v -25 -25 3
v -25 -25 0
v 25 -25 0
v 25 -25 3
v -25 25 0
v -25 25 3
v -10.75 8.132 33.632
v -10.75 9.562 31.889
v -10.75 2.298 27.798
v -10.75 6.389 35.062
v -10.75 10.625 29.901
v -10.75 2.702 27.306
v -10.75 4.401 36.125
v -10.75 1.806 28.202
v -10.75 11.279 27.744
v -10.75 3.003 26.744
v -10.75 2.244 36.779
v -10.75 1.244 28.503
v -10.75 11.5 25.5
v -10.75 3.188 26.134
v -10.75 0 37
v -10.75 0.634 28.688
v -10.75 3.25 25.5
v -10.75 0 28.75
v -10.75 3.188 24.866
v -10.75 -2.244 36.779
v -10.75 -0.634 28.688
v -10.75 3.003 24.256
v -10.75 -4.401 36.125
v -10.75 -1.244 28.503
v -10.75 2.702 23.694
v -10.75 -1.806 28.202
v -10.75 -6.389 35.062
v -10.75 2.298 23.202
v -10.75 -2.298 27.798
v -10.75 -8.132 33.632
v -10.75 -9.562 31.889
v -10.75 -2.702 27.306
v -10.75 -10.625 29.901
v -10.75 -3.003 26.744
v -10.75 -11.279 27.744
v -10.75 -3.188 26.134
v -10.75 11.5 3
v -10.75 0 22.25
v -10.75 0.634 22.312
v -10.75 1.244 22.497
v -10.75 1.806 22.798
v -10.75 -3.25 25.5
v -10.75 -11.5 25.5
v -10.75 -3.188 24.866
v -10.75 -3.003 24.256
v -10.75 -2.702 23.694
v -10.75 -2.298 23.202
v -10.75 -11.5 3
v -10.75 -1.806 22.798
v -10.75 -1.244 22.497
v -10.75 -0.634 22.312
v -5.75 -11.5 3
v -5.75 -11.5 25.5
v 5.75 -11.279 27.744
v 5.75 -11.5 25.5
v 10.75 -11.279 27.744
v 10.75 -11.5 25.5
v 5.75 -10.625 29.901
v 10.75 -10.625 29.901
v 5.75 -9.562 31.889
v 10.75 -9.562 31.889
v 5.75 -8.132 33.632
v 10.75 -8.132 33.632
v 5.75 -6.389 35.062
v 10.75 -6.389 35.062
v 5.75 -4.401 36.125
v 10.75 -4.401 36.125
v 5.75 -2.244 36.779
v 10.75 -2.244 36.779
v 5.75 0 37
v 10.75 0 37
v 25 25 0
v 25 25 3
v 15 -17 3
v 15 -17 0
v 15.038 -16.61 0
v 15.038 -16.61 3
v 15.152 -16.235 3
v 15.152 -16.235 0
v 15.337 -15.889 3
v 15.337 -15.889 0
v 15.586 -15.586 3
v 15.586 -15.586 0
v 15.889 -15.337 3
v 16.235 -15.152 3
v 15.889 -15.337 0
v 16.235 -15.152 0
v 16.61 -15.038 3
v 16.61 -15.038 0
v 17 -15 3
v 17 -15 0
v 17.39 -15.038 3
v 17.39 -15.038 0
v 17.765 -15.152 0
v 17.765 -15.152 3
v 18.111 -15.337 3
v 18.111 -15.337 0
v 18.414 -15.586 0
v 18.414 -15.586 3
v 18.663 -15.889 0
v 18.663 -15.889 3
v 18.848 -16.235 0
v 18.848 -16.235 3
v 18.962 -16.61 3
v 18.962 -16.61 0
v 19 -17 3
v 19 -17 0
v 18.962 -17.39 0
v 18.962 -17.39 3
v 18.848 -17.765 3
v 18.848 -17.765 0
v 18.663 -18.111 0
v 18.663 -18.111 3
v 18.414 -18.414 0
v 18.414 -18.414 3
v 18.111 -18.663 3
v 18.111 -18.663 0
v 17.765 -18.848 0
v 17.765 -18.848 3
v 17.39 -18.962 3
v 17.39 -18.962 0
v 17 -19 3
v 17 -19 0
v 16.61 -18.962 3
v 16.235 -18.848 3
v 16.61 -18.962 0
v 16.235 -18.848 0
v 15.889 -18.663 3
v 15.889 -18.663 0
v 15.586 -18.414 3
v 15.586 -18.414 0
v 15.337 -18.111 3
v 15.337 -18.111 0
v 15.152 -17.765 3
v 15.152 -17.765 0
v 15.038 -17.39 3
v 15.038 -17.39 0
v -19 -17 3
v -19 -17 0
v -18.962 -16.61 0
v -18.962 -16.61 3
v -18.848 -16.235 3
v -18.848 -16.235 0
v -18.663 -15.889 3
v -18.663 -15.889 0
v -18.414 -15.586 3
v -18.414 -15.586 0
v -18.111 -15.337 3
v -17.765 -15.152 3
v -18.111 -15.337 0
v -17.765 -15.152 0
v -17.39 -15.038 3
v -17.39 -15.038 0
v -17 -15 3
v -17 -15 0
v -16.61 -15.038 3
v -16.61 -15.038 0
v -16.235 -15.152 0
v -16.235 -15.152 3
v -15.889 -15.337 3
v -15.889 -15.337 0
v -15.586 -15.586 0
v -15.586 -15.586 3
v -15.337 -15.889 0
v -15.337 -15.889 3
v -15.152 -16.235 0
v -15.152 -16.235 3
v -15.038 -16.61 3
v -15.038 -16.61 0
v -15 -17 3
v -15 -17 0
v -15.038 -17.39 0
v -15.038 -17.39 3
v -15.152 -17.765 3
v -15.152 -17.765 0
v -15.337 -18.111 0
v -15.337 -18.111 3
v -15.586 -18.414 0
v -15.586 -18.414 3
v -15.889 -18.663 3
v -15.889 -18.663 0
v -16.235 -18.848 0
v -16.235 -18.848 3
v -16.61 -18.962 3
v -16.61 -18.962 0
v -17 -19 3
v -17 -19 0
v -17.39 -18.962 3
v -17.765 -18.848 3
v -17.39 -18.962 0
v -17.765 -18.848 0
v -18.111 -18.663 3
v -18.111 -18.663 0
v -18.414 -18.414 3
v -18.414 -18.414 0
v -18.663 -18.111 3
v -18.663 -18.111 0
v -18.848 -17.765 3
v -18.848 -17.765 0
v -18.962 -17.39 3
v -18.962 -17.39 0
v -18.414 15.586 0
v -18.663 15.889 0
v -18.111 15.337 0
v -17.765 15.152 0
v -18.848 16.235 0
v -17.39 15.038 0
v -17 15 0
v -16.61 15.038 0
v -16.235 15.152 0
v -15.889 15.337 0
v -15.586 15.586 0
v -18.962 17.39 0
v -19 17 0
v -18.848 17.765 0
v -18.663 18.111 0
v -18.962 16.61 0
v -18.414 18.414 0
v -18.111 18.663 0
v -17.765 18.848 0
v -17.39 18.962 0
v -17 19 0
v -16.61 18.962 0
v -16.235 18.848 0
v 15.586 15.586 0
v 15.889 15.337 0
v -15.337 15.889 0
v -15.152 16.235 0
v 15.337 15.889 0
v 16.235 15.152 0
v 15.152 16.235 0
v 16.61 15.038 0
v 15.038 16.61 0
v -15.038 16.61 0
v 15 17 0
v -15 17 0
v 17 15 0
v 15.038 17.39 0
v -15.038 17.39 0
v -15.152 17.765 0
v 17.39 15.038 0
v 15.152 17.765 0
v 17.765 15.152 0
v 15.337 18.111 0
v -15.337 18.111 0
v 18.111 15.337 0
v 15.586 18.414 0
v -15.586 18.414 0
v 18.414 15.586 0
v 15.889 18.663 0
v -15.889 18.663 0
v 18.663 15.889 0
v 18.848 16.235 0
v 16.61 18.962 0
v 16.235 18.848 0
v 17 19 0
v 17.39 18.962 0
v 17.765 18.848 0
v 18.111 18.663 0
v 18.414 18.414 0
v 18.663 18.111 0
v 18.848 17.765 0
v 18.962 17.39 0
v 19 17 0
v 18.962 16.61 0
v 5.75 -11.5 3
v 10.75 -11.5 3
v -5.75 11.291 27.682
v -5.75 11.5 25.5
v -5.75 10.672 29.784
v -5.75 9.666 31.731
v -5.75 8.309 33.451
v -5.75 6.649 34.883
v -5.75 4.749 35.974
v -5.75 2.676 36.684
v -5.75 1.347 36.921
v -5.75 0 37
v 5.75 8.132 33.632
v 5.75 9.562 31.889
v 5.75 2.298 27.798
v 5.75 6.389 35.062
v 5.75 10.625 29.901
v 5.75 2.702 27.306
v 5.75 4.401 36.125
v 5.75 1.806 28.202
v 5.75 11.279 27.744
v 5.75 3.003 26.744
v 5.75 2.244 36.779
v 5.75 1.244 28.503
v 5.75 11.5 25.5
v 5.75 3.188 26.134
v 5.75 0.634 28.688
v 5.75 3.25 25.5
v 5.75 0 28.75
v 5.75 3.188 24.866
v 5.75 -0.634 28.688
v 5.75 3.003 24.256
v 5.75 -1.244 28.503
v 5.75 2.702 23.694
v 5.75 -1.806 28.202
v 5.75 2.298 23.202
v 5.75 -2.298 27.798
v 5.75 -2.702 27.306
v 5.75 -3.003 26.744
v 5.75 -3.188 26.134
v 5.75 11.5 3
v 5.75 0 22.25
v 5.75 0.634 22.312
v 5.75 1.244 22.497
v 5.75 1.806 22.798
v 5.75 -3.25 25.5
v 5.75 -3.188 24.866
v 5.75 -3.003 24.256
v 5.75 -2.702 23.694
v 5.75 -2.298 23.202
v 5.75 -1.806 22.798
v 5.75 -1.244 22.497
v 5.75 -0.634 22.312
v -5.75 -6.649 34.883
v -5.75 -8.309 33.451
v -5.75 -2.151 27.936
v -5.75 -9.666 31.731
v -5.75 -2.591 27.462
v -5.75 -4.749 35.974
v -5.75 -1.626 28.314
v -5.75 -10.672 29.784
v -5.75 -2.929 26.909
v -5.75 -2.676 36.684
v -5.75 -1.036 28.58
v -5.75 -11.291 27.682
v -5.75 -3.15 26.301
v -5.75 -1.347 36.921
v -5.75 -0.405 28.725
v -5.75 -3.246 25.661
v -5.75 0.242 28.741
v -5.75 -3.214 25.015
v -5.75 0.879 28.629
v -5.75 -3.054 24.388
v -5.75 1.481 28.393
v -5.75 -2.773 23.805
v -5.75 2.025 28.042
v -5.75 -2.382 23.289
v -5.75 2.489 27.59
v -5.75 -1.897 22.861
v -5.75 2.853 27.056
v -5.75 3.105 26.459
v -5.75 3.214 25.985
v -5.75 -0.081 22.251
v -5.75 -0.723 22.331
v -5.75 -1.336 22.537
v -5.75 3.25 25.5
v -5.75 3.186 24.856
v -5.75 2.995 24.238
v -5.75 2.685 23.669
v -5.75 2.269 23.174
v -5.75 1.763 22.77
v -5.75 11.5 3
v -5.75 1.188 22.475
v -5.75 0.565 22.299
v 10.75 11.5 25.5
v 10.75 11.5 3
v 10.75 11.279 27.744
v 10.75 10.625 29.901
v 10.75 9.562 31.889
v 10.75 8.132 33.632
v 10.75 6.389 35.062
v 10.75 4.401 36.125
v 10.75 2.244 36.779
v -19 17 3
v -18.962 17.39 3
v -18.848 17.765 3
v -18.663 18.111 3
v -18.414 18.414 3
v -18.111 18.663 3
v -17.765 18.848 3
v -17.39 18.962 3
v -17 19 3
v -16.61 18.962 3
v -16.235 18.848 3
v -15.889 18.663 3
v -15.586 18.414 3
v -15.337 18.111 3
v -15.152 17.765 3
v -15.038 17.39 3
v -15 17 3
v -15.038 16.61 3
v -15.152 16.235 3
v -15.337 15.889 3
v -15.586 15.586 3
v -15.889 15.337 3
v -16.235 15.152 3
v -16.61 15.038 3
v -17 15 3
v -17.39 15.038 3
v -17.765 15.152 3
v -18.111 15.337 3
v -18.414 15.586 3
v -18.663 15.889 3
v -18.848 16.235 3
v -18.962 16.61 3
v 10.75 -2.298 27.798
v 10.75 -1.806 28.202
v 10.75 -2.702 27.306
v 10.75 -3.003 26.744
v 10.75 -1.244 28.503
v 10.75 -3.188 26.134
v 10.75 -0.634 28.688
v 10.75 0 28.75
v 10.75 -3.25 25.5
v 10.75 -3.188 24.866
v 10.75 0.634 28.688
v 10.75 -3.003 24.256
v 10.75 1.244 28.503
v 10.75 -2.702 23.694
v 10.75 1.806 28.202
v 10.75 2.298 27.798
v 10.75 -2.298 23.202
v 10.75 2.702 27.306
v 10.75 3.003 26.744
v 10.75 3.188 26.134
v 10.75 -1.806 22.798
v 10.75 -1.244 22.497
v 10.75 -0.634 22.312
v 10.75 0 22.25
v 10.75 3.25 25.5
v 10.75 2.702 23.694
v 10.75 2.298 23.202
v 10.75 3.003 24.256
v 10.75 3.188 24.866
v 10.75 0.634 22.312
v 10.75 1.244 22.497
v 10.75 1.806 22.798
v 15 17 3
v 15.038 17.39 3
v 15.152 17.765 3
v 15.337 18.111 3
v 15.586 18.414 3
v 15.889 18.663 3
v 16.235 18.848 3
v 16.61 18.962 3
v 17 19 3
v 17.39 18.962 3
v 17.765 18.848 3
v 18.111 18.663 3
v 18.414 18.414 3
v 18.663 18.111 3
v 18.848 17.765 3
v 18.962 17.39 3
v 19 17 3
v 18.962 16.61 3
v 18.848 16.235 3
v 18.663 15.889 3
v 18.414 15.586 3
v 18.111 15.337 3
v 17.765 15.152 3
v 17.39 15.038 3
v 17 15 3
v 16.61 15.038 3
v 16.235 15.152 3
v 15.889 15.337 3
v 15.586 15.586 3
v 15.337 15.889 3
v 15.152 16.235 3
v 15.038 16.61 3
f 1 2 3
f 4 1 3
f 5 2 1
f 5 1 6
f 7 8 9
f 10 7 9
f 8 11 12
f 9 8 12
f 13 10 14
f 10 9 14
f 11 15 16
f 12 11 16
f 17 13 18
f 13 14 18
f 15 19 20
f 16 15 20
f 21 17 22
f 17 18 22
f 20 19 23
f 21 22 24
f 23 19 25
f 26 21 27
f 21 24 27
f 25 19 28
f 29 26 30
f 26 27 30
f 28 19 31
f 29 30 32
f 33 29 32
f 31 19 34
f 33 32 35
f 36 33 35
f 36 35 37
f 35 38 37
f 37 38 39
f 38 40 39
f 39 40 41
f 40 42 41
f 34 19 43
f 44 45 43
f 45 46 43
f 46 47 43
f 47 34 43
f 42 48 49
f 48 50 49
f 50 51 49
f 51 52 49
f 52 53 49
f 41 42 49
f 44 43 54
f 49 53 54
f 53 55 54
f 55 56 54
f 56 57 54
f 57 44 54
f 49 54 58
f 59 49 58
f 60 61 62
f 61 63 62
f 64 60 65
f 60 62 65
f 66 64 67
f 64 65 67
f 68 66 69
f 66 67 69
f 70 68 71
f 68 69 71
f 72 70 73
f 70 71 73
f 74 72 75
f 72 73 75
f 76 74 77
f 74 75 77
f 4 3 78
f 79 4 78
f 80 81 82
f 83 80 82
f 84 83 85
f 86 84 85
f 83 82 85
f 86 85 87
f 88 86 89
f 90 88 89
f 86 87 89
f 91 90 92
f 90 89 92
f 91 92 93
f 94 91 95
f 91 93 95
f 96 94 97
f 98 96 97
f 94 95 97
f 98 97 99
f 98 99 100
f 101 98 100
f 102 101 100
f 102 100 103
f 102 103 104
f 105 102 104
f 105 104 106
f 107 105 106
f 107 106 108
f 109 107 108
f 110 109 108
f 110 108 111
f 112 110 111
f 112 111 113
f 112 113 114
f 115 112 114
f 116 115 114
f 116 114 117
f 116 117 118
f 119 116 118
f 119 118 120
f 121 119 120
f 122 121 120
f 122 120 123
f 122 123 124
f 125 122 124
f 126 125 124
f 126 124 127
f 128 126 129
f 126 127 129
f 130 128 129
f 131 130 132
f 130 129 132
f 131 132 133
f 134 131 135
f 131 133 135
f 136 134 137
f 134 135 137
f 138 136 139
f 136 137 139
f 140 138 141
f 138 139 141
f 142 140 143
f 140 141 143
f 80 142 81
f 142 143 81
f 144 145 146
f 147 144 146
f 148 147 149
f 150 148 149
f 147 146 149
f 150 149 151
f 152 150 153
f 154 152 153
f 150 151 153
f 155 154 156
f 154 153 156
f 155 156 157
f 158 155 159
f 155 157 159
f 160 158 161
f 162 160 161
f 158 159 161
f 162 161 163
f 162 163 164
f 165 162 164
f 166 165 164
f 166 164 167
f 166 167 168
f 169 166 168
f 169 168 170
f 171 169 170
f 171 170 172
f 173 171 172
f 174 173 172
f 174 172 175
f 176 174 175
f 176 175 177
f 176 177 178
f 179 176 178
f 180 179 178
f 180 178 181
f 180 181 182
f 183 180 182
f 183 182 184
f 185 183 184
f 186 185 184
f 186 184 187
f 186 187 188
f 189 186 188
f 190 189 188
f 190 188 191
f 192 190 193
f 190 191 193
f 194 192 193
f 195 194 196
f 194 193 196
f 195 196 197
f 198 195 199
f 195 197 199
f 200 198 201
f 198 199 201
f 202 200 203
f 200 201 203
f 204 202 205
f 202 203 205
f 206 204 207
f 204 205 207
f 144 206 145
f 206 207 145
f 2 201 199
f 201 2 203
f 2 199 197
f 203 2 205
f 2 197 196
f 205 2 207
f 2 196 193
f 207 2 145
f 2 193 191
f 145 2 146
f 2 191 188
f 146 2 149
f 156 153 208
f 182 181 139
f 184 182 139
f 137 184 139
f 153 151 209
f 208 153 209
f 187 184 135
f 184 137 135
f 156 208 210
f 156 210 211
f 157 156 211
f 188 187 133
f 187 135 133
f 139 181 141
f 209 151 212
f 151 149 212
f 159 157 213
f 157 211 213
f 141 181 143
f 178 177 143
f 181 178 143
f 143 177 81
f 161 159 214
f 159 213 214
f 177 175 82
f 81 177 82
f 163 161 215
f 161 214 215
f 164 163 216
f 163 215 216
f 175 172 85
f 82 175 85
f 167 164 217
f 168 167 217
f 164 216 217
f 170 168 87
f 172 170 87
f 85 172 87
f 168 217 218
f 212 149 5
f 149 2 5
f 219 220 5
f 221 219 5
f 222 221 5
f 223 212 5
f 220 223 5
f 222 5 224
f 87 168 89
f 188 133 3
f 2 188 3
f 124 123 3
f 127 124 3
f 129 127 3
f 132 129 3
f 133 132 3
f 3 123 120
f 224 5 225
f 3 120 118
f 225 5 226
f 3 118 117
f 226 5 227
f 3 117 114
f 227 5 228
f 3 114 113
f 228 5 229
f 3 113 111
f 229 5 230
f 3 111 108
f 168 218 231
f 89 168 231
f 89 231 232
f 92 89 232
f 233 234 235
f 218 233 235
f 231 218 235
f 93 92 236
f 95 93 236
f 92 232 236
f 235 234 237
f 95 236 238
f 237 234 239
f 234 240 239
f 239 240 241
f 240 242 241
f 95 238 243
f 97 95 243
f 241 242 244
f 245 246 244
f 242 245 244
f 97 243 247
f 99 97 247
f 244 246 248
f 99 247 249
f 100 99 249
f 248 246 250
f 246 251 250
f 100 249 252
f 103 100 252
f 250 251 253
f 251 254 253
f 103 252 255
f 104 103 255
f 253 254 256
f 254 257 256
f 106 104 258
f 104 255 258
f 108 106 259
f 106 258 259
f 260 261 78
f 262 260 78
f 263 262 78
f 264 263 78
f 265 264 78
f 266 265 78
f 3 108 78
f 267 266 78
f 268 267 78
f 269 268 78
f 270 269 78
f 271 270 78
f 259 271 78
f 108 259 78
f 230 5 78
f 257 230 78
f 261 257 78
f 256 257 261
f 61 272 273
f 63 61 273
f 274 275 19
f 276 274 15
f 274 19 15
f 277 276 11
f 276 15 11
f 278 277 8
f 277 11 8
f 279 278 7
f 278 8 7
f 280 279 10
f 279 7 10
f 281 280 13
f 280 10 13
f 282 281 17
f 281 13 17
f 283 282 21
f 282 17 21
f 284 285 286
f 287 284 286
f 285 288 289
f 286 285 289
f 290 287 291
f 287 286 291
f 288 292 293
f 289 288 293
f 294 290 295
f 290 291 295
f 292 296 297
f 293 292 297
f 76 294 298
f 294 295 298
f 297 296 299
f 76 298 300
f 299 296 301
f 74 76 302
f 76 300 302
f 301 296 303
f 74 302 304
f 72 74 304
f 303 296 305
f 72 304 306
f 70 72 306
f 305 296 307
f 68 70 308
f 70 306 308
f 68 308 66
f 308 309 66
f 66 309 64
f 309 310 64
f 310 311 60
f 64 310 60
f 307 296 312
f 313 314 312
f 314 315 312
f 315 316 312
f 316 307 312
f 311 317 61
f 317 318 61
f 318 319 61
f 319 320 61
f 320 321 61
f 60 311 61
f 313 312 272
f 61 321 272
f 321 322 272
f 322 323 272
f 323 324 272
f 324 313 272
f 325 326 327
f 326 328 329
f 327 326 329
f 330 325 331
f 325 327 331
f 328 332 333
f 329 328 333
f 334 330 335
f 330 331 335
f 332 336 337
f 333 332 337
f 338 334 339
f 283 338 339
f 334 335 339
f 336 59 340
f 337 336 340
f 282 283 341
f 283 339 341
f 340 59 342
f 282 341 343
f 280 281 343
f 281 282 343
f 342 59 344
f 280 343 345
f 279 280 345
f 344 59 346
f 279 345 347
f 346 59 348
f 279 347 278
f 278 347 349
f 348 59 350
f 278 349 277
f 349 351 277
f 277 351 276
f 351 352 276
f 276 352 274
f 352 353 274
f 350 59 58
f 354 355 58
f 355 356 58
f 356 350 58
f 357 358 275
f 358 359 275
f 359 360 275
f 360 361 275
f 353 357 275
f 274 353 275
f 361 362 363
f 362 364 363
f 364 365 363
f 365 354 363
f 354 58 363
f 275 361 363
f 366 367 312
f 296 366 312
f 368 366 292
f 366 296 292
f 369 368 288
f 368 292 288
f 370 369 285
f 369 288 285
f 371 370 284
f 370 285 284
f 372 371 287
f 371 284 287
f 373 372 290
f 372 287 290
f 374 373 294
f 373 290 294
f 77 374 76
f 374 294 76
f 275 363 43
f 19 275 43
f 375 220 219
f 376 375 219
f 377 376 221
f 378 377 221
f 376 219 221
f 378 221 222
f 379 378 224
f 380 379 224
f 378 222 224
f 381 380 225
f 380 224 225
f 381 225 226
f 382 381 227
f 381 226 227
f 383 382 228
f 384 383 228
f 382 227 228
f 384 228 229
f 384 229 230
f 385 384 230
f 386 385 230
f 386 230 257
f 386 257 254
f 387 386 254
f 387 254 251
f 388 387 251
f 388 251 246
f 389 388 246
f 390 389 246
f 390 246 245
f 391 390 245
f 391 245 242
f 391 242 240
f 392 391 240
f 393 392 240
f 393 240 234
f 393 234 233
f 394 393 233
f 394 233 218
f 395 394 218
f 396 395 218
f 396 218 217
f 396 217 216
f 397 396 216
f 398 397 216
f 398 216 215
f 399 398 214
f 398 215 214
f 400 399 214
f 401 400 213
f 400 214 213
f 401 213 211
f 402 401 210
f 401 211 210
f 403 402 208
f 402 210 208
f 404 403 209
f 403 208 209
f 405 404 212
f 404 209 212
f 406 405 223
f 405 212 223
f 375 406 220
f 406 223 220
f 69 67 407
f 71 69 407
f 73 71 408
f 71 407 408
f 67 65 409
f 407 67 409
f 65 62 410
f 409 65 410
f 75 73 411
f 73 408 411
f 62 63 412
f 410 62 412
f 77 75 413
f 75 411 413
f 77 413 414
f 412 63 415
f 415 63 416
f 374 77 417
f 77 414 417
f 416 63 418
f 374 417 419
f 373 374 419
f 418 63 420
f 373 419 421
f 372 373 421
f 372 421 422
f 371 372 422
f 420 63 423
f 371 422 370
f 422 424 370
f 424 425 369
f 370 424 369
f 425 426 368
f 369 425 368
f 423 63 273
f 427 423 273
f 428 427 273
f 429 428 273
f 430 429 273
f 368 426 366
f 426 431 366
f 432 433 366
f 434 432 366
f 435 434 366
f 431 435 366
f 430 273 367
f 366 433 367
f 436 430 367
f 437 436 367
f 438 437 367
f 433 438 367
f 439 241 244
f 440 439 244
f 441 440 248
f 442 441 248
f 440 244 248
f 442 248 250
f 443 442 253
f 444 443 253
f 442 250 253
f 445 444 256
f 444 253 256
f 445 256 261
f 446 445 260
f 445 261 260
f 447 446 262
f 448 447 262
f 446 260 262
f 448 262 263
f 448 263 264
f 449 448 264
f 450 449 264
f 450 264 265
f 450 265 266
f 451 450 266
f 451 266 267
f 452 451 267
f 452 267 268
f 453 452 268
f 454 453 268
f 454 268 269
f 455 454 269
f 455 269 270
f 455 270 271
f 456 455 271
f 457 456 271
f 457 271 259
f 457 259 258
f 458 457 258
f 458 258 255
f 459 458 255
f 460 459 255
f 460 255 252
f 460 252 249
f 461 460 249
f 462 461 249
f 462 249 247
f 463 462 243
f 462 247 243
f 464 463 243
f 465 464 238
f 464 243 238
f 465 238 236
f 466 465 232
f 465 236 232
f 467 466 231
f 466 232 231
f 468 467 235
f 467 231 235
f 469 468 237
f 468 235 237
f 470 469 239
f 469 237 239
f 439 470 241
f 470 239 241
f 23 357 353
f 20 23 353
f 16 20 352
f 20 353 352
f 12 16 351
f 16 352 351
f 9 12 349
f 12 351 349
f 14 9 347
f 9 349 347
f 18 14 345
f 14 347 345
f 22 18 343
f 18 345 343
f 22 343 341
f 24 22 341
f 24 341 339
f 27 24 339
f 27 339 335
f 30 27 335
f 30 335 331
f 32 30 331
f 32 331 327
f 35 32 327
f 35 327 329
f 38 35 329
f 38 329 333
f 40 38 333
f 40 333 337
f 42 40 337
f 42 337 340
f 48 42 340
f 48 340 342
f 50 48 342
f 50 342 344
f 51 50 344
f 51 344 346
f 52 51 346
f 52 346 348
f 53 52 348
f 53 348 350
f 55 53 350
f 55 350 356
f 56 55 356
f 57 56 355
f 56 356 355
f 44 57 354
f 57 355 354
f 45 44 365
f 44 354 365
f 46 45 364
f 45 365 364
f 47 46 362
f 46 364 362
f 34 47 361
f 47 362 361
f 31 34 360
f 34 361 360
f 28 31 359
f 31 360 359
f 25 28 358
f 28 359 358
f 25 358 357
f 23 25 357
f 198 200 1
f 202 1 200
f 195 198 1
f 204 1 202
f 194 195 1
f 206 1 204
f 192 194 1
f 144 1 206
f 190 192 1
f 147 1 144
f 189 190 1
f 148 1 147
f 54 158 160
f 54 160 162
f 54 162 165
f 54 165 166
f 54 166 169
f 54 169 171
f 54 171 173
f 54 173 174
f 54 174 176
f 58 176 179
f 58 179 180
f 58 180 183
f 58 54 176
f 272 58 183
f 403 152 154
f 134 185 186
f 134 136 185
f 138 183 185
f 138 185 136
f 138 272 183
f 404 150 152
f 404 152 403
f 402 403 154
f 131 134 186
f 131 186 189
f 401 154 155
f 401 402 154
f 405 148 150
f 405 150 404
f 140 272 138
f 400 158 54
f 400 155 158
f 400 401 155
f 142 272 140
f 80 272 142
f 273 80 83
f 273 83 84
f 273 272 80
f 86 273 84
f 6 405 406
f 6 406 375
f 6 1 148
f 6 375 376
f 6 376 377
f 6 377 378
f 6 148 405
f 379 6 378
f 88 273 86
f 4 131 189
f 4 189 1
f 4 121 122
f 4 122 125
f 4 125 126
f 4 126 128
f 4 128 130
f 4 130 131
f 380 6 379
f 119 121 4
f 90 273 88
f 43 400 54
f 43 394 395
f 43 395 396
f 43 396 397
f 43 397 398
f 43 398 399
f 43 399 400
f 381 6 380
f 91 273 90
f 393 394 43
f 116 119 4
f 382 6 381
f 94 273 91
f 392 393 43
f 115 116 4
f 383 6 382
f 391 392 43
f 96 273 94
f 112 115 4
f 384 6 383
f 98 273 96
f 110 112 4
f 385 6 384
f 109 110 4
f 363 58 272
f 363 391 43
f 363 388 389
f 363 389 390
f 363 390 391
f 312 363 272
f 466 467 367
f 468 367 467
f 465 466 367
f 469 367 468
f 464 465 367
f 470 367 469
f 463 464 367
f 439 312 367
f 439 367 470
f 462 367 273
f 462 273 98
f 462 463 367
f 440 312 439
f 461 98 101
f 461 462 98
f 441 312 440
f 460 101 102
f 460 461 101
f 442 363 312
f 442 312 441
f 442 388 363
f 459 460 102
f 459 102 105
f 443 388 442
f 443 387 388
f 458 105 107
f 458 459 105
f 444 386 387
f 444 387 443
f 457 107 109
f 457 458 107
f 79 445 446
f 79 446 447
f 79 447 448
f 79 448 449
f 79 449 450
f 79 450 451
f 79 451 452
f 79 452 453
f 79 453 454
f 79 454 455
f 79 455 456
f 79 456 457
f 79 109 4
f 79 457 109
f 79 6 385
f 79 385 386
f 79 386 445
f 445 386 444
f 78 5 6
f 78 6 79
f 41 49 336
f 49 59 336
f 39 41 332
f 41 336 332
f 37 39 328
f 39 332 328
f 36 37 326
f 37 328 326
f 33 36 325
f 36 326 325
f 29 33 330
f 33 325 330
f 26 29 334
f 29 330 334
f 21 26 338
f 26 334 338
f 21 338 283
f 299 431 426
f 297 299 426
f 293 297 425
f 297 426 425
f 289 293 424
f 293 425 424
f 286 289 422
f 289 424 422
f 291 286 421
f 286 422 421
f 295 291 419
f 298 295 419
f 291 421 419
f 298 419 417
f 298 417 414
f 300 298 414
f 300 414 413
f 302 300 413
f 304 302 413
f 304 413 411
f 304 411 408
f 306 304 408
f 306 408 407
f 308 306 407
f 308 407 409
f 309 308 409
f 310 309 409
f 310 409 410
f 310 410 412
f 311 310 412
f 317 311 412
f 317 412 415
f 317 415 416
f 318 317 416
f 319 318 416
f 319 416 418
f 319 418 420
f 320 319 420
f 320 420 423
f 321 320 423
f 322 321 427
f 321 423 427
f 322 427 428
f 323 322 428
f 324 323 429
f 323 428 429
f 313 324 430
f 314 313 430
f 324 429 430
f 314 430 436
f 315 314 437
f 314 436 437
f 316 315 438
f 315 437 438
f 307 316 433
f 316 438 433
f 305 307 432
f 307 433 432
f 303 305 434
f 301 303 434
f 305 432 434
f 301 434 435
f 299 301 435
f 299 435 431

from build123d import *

# Parameters (mm, degrees)
F0_W     = 50
F0_H     = 50
F1_DEPTH = 3
F3_DEPTH = 34
F4_R     = 11.49999
F6_D     = 6.5
F8_D     = 4
F8_DEPTH = 15
F8_TIP   = 1.2017212381


# Not quite as in the source:
# - a fillet or chamfer is up to 0.001 mm smaller than in the source, because OpenCascade refuses the exact size


with BuildPart() as f1:
    # F0 (on Top) → F1 (new body)
    with BuildSketch(Plane.XY):
        Rectangle(F0_W, F0_H)
    extrude(amount=F1_DEPTH)

    # F2 (on face) → F3 (join)
    with BuildSketch(Plane.XY.offset(3)):
        Polygon((5.74977943, 11.5), (5.74977943, 0), (5.74977943, -11.4999999979), (10.74977943, -11.4999999979), (10.74977943, 2.1e-09), (10.74977943, 11.5), align=None)
        Polygon((-5.75022057, -11.4999999979), (-5.75, 0), (-5.74977943, 11.5000000021), (-10.75022057, 11.5000000021), (-10.75022057, 2.1e-09), (-10.75022057, -11.4999999979), align=None)
    extrude(amount=F3_DEPTH)

    # F4 (radius 11.5 in the source; OpenCascade refuses exactly that, so slightly less here)
    f4_edges = [f1.edges().sort_by_distance(p)[0] for p in [
        (-8.250221, -11.5, 37),
        (8.249779, -11.5, 37),
        (8.249779, 11.5, 37),
        (-8.25, 11.5, 37),
    ]]
    fillet(f4_edges, radius=F4_R)

    # F6 (through all)
    with Locations(Plane(origin=(-10.75022057, 0, 0), x_dir=(0, -1, 0), z_dir=(-1, 0, 0))):
        with Locations((-2.1e-09, 25.5)):
            Hole(F6_D / 2)

    # F8
    with Locations(Plane.XY.offset(3)):
        with Locations((-17, 17), (17, 17), (17, -17), (-17, -17)):
            Hole(F8_D / 2, depth=F8_DEPTH)
            with Locations((0, 0, -(F8_DEPTH + F8_TIP / 2))):  # 118° drill point
                Cone(0, F8_D / 2, F8_TIP, mode=Mode.SUBTRACT)


solid = f1.part
